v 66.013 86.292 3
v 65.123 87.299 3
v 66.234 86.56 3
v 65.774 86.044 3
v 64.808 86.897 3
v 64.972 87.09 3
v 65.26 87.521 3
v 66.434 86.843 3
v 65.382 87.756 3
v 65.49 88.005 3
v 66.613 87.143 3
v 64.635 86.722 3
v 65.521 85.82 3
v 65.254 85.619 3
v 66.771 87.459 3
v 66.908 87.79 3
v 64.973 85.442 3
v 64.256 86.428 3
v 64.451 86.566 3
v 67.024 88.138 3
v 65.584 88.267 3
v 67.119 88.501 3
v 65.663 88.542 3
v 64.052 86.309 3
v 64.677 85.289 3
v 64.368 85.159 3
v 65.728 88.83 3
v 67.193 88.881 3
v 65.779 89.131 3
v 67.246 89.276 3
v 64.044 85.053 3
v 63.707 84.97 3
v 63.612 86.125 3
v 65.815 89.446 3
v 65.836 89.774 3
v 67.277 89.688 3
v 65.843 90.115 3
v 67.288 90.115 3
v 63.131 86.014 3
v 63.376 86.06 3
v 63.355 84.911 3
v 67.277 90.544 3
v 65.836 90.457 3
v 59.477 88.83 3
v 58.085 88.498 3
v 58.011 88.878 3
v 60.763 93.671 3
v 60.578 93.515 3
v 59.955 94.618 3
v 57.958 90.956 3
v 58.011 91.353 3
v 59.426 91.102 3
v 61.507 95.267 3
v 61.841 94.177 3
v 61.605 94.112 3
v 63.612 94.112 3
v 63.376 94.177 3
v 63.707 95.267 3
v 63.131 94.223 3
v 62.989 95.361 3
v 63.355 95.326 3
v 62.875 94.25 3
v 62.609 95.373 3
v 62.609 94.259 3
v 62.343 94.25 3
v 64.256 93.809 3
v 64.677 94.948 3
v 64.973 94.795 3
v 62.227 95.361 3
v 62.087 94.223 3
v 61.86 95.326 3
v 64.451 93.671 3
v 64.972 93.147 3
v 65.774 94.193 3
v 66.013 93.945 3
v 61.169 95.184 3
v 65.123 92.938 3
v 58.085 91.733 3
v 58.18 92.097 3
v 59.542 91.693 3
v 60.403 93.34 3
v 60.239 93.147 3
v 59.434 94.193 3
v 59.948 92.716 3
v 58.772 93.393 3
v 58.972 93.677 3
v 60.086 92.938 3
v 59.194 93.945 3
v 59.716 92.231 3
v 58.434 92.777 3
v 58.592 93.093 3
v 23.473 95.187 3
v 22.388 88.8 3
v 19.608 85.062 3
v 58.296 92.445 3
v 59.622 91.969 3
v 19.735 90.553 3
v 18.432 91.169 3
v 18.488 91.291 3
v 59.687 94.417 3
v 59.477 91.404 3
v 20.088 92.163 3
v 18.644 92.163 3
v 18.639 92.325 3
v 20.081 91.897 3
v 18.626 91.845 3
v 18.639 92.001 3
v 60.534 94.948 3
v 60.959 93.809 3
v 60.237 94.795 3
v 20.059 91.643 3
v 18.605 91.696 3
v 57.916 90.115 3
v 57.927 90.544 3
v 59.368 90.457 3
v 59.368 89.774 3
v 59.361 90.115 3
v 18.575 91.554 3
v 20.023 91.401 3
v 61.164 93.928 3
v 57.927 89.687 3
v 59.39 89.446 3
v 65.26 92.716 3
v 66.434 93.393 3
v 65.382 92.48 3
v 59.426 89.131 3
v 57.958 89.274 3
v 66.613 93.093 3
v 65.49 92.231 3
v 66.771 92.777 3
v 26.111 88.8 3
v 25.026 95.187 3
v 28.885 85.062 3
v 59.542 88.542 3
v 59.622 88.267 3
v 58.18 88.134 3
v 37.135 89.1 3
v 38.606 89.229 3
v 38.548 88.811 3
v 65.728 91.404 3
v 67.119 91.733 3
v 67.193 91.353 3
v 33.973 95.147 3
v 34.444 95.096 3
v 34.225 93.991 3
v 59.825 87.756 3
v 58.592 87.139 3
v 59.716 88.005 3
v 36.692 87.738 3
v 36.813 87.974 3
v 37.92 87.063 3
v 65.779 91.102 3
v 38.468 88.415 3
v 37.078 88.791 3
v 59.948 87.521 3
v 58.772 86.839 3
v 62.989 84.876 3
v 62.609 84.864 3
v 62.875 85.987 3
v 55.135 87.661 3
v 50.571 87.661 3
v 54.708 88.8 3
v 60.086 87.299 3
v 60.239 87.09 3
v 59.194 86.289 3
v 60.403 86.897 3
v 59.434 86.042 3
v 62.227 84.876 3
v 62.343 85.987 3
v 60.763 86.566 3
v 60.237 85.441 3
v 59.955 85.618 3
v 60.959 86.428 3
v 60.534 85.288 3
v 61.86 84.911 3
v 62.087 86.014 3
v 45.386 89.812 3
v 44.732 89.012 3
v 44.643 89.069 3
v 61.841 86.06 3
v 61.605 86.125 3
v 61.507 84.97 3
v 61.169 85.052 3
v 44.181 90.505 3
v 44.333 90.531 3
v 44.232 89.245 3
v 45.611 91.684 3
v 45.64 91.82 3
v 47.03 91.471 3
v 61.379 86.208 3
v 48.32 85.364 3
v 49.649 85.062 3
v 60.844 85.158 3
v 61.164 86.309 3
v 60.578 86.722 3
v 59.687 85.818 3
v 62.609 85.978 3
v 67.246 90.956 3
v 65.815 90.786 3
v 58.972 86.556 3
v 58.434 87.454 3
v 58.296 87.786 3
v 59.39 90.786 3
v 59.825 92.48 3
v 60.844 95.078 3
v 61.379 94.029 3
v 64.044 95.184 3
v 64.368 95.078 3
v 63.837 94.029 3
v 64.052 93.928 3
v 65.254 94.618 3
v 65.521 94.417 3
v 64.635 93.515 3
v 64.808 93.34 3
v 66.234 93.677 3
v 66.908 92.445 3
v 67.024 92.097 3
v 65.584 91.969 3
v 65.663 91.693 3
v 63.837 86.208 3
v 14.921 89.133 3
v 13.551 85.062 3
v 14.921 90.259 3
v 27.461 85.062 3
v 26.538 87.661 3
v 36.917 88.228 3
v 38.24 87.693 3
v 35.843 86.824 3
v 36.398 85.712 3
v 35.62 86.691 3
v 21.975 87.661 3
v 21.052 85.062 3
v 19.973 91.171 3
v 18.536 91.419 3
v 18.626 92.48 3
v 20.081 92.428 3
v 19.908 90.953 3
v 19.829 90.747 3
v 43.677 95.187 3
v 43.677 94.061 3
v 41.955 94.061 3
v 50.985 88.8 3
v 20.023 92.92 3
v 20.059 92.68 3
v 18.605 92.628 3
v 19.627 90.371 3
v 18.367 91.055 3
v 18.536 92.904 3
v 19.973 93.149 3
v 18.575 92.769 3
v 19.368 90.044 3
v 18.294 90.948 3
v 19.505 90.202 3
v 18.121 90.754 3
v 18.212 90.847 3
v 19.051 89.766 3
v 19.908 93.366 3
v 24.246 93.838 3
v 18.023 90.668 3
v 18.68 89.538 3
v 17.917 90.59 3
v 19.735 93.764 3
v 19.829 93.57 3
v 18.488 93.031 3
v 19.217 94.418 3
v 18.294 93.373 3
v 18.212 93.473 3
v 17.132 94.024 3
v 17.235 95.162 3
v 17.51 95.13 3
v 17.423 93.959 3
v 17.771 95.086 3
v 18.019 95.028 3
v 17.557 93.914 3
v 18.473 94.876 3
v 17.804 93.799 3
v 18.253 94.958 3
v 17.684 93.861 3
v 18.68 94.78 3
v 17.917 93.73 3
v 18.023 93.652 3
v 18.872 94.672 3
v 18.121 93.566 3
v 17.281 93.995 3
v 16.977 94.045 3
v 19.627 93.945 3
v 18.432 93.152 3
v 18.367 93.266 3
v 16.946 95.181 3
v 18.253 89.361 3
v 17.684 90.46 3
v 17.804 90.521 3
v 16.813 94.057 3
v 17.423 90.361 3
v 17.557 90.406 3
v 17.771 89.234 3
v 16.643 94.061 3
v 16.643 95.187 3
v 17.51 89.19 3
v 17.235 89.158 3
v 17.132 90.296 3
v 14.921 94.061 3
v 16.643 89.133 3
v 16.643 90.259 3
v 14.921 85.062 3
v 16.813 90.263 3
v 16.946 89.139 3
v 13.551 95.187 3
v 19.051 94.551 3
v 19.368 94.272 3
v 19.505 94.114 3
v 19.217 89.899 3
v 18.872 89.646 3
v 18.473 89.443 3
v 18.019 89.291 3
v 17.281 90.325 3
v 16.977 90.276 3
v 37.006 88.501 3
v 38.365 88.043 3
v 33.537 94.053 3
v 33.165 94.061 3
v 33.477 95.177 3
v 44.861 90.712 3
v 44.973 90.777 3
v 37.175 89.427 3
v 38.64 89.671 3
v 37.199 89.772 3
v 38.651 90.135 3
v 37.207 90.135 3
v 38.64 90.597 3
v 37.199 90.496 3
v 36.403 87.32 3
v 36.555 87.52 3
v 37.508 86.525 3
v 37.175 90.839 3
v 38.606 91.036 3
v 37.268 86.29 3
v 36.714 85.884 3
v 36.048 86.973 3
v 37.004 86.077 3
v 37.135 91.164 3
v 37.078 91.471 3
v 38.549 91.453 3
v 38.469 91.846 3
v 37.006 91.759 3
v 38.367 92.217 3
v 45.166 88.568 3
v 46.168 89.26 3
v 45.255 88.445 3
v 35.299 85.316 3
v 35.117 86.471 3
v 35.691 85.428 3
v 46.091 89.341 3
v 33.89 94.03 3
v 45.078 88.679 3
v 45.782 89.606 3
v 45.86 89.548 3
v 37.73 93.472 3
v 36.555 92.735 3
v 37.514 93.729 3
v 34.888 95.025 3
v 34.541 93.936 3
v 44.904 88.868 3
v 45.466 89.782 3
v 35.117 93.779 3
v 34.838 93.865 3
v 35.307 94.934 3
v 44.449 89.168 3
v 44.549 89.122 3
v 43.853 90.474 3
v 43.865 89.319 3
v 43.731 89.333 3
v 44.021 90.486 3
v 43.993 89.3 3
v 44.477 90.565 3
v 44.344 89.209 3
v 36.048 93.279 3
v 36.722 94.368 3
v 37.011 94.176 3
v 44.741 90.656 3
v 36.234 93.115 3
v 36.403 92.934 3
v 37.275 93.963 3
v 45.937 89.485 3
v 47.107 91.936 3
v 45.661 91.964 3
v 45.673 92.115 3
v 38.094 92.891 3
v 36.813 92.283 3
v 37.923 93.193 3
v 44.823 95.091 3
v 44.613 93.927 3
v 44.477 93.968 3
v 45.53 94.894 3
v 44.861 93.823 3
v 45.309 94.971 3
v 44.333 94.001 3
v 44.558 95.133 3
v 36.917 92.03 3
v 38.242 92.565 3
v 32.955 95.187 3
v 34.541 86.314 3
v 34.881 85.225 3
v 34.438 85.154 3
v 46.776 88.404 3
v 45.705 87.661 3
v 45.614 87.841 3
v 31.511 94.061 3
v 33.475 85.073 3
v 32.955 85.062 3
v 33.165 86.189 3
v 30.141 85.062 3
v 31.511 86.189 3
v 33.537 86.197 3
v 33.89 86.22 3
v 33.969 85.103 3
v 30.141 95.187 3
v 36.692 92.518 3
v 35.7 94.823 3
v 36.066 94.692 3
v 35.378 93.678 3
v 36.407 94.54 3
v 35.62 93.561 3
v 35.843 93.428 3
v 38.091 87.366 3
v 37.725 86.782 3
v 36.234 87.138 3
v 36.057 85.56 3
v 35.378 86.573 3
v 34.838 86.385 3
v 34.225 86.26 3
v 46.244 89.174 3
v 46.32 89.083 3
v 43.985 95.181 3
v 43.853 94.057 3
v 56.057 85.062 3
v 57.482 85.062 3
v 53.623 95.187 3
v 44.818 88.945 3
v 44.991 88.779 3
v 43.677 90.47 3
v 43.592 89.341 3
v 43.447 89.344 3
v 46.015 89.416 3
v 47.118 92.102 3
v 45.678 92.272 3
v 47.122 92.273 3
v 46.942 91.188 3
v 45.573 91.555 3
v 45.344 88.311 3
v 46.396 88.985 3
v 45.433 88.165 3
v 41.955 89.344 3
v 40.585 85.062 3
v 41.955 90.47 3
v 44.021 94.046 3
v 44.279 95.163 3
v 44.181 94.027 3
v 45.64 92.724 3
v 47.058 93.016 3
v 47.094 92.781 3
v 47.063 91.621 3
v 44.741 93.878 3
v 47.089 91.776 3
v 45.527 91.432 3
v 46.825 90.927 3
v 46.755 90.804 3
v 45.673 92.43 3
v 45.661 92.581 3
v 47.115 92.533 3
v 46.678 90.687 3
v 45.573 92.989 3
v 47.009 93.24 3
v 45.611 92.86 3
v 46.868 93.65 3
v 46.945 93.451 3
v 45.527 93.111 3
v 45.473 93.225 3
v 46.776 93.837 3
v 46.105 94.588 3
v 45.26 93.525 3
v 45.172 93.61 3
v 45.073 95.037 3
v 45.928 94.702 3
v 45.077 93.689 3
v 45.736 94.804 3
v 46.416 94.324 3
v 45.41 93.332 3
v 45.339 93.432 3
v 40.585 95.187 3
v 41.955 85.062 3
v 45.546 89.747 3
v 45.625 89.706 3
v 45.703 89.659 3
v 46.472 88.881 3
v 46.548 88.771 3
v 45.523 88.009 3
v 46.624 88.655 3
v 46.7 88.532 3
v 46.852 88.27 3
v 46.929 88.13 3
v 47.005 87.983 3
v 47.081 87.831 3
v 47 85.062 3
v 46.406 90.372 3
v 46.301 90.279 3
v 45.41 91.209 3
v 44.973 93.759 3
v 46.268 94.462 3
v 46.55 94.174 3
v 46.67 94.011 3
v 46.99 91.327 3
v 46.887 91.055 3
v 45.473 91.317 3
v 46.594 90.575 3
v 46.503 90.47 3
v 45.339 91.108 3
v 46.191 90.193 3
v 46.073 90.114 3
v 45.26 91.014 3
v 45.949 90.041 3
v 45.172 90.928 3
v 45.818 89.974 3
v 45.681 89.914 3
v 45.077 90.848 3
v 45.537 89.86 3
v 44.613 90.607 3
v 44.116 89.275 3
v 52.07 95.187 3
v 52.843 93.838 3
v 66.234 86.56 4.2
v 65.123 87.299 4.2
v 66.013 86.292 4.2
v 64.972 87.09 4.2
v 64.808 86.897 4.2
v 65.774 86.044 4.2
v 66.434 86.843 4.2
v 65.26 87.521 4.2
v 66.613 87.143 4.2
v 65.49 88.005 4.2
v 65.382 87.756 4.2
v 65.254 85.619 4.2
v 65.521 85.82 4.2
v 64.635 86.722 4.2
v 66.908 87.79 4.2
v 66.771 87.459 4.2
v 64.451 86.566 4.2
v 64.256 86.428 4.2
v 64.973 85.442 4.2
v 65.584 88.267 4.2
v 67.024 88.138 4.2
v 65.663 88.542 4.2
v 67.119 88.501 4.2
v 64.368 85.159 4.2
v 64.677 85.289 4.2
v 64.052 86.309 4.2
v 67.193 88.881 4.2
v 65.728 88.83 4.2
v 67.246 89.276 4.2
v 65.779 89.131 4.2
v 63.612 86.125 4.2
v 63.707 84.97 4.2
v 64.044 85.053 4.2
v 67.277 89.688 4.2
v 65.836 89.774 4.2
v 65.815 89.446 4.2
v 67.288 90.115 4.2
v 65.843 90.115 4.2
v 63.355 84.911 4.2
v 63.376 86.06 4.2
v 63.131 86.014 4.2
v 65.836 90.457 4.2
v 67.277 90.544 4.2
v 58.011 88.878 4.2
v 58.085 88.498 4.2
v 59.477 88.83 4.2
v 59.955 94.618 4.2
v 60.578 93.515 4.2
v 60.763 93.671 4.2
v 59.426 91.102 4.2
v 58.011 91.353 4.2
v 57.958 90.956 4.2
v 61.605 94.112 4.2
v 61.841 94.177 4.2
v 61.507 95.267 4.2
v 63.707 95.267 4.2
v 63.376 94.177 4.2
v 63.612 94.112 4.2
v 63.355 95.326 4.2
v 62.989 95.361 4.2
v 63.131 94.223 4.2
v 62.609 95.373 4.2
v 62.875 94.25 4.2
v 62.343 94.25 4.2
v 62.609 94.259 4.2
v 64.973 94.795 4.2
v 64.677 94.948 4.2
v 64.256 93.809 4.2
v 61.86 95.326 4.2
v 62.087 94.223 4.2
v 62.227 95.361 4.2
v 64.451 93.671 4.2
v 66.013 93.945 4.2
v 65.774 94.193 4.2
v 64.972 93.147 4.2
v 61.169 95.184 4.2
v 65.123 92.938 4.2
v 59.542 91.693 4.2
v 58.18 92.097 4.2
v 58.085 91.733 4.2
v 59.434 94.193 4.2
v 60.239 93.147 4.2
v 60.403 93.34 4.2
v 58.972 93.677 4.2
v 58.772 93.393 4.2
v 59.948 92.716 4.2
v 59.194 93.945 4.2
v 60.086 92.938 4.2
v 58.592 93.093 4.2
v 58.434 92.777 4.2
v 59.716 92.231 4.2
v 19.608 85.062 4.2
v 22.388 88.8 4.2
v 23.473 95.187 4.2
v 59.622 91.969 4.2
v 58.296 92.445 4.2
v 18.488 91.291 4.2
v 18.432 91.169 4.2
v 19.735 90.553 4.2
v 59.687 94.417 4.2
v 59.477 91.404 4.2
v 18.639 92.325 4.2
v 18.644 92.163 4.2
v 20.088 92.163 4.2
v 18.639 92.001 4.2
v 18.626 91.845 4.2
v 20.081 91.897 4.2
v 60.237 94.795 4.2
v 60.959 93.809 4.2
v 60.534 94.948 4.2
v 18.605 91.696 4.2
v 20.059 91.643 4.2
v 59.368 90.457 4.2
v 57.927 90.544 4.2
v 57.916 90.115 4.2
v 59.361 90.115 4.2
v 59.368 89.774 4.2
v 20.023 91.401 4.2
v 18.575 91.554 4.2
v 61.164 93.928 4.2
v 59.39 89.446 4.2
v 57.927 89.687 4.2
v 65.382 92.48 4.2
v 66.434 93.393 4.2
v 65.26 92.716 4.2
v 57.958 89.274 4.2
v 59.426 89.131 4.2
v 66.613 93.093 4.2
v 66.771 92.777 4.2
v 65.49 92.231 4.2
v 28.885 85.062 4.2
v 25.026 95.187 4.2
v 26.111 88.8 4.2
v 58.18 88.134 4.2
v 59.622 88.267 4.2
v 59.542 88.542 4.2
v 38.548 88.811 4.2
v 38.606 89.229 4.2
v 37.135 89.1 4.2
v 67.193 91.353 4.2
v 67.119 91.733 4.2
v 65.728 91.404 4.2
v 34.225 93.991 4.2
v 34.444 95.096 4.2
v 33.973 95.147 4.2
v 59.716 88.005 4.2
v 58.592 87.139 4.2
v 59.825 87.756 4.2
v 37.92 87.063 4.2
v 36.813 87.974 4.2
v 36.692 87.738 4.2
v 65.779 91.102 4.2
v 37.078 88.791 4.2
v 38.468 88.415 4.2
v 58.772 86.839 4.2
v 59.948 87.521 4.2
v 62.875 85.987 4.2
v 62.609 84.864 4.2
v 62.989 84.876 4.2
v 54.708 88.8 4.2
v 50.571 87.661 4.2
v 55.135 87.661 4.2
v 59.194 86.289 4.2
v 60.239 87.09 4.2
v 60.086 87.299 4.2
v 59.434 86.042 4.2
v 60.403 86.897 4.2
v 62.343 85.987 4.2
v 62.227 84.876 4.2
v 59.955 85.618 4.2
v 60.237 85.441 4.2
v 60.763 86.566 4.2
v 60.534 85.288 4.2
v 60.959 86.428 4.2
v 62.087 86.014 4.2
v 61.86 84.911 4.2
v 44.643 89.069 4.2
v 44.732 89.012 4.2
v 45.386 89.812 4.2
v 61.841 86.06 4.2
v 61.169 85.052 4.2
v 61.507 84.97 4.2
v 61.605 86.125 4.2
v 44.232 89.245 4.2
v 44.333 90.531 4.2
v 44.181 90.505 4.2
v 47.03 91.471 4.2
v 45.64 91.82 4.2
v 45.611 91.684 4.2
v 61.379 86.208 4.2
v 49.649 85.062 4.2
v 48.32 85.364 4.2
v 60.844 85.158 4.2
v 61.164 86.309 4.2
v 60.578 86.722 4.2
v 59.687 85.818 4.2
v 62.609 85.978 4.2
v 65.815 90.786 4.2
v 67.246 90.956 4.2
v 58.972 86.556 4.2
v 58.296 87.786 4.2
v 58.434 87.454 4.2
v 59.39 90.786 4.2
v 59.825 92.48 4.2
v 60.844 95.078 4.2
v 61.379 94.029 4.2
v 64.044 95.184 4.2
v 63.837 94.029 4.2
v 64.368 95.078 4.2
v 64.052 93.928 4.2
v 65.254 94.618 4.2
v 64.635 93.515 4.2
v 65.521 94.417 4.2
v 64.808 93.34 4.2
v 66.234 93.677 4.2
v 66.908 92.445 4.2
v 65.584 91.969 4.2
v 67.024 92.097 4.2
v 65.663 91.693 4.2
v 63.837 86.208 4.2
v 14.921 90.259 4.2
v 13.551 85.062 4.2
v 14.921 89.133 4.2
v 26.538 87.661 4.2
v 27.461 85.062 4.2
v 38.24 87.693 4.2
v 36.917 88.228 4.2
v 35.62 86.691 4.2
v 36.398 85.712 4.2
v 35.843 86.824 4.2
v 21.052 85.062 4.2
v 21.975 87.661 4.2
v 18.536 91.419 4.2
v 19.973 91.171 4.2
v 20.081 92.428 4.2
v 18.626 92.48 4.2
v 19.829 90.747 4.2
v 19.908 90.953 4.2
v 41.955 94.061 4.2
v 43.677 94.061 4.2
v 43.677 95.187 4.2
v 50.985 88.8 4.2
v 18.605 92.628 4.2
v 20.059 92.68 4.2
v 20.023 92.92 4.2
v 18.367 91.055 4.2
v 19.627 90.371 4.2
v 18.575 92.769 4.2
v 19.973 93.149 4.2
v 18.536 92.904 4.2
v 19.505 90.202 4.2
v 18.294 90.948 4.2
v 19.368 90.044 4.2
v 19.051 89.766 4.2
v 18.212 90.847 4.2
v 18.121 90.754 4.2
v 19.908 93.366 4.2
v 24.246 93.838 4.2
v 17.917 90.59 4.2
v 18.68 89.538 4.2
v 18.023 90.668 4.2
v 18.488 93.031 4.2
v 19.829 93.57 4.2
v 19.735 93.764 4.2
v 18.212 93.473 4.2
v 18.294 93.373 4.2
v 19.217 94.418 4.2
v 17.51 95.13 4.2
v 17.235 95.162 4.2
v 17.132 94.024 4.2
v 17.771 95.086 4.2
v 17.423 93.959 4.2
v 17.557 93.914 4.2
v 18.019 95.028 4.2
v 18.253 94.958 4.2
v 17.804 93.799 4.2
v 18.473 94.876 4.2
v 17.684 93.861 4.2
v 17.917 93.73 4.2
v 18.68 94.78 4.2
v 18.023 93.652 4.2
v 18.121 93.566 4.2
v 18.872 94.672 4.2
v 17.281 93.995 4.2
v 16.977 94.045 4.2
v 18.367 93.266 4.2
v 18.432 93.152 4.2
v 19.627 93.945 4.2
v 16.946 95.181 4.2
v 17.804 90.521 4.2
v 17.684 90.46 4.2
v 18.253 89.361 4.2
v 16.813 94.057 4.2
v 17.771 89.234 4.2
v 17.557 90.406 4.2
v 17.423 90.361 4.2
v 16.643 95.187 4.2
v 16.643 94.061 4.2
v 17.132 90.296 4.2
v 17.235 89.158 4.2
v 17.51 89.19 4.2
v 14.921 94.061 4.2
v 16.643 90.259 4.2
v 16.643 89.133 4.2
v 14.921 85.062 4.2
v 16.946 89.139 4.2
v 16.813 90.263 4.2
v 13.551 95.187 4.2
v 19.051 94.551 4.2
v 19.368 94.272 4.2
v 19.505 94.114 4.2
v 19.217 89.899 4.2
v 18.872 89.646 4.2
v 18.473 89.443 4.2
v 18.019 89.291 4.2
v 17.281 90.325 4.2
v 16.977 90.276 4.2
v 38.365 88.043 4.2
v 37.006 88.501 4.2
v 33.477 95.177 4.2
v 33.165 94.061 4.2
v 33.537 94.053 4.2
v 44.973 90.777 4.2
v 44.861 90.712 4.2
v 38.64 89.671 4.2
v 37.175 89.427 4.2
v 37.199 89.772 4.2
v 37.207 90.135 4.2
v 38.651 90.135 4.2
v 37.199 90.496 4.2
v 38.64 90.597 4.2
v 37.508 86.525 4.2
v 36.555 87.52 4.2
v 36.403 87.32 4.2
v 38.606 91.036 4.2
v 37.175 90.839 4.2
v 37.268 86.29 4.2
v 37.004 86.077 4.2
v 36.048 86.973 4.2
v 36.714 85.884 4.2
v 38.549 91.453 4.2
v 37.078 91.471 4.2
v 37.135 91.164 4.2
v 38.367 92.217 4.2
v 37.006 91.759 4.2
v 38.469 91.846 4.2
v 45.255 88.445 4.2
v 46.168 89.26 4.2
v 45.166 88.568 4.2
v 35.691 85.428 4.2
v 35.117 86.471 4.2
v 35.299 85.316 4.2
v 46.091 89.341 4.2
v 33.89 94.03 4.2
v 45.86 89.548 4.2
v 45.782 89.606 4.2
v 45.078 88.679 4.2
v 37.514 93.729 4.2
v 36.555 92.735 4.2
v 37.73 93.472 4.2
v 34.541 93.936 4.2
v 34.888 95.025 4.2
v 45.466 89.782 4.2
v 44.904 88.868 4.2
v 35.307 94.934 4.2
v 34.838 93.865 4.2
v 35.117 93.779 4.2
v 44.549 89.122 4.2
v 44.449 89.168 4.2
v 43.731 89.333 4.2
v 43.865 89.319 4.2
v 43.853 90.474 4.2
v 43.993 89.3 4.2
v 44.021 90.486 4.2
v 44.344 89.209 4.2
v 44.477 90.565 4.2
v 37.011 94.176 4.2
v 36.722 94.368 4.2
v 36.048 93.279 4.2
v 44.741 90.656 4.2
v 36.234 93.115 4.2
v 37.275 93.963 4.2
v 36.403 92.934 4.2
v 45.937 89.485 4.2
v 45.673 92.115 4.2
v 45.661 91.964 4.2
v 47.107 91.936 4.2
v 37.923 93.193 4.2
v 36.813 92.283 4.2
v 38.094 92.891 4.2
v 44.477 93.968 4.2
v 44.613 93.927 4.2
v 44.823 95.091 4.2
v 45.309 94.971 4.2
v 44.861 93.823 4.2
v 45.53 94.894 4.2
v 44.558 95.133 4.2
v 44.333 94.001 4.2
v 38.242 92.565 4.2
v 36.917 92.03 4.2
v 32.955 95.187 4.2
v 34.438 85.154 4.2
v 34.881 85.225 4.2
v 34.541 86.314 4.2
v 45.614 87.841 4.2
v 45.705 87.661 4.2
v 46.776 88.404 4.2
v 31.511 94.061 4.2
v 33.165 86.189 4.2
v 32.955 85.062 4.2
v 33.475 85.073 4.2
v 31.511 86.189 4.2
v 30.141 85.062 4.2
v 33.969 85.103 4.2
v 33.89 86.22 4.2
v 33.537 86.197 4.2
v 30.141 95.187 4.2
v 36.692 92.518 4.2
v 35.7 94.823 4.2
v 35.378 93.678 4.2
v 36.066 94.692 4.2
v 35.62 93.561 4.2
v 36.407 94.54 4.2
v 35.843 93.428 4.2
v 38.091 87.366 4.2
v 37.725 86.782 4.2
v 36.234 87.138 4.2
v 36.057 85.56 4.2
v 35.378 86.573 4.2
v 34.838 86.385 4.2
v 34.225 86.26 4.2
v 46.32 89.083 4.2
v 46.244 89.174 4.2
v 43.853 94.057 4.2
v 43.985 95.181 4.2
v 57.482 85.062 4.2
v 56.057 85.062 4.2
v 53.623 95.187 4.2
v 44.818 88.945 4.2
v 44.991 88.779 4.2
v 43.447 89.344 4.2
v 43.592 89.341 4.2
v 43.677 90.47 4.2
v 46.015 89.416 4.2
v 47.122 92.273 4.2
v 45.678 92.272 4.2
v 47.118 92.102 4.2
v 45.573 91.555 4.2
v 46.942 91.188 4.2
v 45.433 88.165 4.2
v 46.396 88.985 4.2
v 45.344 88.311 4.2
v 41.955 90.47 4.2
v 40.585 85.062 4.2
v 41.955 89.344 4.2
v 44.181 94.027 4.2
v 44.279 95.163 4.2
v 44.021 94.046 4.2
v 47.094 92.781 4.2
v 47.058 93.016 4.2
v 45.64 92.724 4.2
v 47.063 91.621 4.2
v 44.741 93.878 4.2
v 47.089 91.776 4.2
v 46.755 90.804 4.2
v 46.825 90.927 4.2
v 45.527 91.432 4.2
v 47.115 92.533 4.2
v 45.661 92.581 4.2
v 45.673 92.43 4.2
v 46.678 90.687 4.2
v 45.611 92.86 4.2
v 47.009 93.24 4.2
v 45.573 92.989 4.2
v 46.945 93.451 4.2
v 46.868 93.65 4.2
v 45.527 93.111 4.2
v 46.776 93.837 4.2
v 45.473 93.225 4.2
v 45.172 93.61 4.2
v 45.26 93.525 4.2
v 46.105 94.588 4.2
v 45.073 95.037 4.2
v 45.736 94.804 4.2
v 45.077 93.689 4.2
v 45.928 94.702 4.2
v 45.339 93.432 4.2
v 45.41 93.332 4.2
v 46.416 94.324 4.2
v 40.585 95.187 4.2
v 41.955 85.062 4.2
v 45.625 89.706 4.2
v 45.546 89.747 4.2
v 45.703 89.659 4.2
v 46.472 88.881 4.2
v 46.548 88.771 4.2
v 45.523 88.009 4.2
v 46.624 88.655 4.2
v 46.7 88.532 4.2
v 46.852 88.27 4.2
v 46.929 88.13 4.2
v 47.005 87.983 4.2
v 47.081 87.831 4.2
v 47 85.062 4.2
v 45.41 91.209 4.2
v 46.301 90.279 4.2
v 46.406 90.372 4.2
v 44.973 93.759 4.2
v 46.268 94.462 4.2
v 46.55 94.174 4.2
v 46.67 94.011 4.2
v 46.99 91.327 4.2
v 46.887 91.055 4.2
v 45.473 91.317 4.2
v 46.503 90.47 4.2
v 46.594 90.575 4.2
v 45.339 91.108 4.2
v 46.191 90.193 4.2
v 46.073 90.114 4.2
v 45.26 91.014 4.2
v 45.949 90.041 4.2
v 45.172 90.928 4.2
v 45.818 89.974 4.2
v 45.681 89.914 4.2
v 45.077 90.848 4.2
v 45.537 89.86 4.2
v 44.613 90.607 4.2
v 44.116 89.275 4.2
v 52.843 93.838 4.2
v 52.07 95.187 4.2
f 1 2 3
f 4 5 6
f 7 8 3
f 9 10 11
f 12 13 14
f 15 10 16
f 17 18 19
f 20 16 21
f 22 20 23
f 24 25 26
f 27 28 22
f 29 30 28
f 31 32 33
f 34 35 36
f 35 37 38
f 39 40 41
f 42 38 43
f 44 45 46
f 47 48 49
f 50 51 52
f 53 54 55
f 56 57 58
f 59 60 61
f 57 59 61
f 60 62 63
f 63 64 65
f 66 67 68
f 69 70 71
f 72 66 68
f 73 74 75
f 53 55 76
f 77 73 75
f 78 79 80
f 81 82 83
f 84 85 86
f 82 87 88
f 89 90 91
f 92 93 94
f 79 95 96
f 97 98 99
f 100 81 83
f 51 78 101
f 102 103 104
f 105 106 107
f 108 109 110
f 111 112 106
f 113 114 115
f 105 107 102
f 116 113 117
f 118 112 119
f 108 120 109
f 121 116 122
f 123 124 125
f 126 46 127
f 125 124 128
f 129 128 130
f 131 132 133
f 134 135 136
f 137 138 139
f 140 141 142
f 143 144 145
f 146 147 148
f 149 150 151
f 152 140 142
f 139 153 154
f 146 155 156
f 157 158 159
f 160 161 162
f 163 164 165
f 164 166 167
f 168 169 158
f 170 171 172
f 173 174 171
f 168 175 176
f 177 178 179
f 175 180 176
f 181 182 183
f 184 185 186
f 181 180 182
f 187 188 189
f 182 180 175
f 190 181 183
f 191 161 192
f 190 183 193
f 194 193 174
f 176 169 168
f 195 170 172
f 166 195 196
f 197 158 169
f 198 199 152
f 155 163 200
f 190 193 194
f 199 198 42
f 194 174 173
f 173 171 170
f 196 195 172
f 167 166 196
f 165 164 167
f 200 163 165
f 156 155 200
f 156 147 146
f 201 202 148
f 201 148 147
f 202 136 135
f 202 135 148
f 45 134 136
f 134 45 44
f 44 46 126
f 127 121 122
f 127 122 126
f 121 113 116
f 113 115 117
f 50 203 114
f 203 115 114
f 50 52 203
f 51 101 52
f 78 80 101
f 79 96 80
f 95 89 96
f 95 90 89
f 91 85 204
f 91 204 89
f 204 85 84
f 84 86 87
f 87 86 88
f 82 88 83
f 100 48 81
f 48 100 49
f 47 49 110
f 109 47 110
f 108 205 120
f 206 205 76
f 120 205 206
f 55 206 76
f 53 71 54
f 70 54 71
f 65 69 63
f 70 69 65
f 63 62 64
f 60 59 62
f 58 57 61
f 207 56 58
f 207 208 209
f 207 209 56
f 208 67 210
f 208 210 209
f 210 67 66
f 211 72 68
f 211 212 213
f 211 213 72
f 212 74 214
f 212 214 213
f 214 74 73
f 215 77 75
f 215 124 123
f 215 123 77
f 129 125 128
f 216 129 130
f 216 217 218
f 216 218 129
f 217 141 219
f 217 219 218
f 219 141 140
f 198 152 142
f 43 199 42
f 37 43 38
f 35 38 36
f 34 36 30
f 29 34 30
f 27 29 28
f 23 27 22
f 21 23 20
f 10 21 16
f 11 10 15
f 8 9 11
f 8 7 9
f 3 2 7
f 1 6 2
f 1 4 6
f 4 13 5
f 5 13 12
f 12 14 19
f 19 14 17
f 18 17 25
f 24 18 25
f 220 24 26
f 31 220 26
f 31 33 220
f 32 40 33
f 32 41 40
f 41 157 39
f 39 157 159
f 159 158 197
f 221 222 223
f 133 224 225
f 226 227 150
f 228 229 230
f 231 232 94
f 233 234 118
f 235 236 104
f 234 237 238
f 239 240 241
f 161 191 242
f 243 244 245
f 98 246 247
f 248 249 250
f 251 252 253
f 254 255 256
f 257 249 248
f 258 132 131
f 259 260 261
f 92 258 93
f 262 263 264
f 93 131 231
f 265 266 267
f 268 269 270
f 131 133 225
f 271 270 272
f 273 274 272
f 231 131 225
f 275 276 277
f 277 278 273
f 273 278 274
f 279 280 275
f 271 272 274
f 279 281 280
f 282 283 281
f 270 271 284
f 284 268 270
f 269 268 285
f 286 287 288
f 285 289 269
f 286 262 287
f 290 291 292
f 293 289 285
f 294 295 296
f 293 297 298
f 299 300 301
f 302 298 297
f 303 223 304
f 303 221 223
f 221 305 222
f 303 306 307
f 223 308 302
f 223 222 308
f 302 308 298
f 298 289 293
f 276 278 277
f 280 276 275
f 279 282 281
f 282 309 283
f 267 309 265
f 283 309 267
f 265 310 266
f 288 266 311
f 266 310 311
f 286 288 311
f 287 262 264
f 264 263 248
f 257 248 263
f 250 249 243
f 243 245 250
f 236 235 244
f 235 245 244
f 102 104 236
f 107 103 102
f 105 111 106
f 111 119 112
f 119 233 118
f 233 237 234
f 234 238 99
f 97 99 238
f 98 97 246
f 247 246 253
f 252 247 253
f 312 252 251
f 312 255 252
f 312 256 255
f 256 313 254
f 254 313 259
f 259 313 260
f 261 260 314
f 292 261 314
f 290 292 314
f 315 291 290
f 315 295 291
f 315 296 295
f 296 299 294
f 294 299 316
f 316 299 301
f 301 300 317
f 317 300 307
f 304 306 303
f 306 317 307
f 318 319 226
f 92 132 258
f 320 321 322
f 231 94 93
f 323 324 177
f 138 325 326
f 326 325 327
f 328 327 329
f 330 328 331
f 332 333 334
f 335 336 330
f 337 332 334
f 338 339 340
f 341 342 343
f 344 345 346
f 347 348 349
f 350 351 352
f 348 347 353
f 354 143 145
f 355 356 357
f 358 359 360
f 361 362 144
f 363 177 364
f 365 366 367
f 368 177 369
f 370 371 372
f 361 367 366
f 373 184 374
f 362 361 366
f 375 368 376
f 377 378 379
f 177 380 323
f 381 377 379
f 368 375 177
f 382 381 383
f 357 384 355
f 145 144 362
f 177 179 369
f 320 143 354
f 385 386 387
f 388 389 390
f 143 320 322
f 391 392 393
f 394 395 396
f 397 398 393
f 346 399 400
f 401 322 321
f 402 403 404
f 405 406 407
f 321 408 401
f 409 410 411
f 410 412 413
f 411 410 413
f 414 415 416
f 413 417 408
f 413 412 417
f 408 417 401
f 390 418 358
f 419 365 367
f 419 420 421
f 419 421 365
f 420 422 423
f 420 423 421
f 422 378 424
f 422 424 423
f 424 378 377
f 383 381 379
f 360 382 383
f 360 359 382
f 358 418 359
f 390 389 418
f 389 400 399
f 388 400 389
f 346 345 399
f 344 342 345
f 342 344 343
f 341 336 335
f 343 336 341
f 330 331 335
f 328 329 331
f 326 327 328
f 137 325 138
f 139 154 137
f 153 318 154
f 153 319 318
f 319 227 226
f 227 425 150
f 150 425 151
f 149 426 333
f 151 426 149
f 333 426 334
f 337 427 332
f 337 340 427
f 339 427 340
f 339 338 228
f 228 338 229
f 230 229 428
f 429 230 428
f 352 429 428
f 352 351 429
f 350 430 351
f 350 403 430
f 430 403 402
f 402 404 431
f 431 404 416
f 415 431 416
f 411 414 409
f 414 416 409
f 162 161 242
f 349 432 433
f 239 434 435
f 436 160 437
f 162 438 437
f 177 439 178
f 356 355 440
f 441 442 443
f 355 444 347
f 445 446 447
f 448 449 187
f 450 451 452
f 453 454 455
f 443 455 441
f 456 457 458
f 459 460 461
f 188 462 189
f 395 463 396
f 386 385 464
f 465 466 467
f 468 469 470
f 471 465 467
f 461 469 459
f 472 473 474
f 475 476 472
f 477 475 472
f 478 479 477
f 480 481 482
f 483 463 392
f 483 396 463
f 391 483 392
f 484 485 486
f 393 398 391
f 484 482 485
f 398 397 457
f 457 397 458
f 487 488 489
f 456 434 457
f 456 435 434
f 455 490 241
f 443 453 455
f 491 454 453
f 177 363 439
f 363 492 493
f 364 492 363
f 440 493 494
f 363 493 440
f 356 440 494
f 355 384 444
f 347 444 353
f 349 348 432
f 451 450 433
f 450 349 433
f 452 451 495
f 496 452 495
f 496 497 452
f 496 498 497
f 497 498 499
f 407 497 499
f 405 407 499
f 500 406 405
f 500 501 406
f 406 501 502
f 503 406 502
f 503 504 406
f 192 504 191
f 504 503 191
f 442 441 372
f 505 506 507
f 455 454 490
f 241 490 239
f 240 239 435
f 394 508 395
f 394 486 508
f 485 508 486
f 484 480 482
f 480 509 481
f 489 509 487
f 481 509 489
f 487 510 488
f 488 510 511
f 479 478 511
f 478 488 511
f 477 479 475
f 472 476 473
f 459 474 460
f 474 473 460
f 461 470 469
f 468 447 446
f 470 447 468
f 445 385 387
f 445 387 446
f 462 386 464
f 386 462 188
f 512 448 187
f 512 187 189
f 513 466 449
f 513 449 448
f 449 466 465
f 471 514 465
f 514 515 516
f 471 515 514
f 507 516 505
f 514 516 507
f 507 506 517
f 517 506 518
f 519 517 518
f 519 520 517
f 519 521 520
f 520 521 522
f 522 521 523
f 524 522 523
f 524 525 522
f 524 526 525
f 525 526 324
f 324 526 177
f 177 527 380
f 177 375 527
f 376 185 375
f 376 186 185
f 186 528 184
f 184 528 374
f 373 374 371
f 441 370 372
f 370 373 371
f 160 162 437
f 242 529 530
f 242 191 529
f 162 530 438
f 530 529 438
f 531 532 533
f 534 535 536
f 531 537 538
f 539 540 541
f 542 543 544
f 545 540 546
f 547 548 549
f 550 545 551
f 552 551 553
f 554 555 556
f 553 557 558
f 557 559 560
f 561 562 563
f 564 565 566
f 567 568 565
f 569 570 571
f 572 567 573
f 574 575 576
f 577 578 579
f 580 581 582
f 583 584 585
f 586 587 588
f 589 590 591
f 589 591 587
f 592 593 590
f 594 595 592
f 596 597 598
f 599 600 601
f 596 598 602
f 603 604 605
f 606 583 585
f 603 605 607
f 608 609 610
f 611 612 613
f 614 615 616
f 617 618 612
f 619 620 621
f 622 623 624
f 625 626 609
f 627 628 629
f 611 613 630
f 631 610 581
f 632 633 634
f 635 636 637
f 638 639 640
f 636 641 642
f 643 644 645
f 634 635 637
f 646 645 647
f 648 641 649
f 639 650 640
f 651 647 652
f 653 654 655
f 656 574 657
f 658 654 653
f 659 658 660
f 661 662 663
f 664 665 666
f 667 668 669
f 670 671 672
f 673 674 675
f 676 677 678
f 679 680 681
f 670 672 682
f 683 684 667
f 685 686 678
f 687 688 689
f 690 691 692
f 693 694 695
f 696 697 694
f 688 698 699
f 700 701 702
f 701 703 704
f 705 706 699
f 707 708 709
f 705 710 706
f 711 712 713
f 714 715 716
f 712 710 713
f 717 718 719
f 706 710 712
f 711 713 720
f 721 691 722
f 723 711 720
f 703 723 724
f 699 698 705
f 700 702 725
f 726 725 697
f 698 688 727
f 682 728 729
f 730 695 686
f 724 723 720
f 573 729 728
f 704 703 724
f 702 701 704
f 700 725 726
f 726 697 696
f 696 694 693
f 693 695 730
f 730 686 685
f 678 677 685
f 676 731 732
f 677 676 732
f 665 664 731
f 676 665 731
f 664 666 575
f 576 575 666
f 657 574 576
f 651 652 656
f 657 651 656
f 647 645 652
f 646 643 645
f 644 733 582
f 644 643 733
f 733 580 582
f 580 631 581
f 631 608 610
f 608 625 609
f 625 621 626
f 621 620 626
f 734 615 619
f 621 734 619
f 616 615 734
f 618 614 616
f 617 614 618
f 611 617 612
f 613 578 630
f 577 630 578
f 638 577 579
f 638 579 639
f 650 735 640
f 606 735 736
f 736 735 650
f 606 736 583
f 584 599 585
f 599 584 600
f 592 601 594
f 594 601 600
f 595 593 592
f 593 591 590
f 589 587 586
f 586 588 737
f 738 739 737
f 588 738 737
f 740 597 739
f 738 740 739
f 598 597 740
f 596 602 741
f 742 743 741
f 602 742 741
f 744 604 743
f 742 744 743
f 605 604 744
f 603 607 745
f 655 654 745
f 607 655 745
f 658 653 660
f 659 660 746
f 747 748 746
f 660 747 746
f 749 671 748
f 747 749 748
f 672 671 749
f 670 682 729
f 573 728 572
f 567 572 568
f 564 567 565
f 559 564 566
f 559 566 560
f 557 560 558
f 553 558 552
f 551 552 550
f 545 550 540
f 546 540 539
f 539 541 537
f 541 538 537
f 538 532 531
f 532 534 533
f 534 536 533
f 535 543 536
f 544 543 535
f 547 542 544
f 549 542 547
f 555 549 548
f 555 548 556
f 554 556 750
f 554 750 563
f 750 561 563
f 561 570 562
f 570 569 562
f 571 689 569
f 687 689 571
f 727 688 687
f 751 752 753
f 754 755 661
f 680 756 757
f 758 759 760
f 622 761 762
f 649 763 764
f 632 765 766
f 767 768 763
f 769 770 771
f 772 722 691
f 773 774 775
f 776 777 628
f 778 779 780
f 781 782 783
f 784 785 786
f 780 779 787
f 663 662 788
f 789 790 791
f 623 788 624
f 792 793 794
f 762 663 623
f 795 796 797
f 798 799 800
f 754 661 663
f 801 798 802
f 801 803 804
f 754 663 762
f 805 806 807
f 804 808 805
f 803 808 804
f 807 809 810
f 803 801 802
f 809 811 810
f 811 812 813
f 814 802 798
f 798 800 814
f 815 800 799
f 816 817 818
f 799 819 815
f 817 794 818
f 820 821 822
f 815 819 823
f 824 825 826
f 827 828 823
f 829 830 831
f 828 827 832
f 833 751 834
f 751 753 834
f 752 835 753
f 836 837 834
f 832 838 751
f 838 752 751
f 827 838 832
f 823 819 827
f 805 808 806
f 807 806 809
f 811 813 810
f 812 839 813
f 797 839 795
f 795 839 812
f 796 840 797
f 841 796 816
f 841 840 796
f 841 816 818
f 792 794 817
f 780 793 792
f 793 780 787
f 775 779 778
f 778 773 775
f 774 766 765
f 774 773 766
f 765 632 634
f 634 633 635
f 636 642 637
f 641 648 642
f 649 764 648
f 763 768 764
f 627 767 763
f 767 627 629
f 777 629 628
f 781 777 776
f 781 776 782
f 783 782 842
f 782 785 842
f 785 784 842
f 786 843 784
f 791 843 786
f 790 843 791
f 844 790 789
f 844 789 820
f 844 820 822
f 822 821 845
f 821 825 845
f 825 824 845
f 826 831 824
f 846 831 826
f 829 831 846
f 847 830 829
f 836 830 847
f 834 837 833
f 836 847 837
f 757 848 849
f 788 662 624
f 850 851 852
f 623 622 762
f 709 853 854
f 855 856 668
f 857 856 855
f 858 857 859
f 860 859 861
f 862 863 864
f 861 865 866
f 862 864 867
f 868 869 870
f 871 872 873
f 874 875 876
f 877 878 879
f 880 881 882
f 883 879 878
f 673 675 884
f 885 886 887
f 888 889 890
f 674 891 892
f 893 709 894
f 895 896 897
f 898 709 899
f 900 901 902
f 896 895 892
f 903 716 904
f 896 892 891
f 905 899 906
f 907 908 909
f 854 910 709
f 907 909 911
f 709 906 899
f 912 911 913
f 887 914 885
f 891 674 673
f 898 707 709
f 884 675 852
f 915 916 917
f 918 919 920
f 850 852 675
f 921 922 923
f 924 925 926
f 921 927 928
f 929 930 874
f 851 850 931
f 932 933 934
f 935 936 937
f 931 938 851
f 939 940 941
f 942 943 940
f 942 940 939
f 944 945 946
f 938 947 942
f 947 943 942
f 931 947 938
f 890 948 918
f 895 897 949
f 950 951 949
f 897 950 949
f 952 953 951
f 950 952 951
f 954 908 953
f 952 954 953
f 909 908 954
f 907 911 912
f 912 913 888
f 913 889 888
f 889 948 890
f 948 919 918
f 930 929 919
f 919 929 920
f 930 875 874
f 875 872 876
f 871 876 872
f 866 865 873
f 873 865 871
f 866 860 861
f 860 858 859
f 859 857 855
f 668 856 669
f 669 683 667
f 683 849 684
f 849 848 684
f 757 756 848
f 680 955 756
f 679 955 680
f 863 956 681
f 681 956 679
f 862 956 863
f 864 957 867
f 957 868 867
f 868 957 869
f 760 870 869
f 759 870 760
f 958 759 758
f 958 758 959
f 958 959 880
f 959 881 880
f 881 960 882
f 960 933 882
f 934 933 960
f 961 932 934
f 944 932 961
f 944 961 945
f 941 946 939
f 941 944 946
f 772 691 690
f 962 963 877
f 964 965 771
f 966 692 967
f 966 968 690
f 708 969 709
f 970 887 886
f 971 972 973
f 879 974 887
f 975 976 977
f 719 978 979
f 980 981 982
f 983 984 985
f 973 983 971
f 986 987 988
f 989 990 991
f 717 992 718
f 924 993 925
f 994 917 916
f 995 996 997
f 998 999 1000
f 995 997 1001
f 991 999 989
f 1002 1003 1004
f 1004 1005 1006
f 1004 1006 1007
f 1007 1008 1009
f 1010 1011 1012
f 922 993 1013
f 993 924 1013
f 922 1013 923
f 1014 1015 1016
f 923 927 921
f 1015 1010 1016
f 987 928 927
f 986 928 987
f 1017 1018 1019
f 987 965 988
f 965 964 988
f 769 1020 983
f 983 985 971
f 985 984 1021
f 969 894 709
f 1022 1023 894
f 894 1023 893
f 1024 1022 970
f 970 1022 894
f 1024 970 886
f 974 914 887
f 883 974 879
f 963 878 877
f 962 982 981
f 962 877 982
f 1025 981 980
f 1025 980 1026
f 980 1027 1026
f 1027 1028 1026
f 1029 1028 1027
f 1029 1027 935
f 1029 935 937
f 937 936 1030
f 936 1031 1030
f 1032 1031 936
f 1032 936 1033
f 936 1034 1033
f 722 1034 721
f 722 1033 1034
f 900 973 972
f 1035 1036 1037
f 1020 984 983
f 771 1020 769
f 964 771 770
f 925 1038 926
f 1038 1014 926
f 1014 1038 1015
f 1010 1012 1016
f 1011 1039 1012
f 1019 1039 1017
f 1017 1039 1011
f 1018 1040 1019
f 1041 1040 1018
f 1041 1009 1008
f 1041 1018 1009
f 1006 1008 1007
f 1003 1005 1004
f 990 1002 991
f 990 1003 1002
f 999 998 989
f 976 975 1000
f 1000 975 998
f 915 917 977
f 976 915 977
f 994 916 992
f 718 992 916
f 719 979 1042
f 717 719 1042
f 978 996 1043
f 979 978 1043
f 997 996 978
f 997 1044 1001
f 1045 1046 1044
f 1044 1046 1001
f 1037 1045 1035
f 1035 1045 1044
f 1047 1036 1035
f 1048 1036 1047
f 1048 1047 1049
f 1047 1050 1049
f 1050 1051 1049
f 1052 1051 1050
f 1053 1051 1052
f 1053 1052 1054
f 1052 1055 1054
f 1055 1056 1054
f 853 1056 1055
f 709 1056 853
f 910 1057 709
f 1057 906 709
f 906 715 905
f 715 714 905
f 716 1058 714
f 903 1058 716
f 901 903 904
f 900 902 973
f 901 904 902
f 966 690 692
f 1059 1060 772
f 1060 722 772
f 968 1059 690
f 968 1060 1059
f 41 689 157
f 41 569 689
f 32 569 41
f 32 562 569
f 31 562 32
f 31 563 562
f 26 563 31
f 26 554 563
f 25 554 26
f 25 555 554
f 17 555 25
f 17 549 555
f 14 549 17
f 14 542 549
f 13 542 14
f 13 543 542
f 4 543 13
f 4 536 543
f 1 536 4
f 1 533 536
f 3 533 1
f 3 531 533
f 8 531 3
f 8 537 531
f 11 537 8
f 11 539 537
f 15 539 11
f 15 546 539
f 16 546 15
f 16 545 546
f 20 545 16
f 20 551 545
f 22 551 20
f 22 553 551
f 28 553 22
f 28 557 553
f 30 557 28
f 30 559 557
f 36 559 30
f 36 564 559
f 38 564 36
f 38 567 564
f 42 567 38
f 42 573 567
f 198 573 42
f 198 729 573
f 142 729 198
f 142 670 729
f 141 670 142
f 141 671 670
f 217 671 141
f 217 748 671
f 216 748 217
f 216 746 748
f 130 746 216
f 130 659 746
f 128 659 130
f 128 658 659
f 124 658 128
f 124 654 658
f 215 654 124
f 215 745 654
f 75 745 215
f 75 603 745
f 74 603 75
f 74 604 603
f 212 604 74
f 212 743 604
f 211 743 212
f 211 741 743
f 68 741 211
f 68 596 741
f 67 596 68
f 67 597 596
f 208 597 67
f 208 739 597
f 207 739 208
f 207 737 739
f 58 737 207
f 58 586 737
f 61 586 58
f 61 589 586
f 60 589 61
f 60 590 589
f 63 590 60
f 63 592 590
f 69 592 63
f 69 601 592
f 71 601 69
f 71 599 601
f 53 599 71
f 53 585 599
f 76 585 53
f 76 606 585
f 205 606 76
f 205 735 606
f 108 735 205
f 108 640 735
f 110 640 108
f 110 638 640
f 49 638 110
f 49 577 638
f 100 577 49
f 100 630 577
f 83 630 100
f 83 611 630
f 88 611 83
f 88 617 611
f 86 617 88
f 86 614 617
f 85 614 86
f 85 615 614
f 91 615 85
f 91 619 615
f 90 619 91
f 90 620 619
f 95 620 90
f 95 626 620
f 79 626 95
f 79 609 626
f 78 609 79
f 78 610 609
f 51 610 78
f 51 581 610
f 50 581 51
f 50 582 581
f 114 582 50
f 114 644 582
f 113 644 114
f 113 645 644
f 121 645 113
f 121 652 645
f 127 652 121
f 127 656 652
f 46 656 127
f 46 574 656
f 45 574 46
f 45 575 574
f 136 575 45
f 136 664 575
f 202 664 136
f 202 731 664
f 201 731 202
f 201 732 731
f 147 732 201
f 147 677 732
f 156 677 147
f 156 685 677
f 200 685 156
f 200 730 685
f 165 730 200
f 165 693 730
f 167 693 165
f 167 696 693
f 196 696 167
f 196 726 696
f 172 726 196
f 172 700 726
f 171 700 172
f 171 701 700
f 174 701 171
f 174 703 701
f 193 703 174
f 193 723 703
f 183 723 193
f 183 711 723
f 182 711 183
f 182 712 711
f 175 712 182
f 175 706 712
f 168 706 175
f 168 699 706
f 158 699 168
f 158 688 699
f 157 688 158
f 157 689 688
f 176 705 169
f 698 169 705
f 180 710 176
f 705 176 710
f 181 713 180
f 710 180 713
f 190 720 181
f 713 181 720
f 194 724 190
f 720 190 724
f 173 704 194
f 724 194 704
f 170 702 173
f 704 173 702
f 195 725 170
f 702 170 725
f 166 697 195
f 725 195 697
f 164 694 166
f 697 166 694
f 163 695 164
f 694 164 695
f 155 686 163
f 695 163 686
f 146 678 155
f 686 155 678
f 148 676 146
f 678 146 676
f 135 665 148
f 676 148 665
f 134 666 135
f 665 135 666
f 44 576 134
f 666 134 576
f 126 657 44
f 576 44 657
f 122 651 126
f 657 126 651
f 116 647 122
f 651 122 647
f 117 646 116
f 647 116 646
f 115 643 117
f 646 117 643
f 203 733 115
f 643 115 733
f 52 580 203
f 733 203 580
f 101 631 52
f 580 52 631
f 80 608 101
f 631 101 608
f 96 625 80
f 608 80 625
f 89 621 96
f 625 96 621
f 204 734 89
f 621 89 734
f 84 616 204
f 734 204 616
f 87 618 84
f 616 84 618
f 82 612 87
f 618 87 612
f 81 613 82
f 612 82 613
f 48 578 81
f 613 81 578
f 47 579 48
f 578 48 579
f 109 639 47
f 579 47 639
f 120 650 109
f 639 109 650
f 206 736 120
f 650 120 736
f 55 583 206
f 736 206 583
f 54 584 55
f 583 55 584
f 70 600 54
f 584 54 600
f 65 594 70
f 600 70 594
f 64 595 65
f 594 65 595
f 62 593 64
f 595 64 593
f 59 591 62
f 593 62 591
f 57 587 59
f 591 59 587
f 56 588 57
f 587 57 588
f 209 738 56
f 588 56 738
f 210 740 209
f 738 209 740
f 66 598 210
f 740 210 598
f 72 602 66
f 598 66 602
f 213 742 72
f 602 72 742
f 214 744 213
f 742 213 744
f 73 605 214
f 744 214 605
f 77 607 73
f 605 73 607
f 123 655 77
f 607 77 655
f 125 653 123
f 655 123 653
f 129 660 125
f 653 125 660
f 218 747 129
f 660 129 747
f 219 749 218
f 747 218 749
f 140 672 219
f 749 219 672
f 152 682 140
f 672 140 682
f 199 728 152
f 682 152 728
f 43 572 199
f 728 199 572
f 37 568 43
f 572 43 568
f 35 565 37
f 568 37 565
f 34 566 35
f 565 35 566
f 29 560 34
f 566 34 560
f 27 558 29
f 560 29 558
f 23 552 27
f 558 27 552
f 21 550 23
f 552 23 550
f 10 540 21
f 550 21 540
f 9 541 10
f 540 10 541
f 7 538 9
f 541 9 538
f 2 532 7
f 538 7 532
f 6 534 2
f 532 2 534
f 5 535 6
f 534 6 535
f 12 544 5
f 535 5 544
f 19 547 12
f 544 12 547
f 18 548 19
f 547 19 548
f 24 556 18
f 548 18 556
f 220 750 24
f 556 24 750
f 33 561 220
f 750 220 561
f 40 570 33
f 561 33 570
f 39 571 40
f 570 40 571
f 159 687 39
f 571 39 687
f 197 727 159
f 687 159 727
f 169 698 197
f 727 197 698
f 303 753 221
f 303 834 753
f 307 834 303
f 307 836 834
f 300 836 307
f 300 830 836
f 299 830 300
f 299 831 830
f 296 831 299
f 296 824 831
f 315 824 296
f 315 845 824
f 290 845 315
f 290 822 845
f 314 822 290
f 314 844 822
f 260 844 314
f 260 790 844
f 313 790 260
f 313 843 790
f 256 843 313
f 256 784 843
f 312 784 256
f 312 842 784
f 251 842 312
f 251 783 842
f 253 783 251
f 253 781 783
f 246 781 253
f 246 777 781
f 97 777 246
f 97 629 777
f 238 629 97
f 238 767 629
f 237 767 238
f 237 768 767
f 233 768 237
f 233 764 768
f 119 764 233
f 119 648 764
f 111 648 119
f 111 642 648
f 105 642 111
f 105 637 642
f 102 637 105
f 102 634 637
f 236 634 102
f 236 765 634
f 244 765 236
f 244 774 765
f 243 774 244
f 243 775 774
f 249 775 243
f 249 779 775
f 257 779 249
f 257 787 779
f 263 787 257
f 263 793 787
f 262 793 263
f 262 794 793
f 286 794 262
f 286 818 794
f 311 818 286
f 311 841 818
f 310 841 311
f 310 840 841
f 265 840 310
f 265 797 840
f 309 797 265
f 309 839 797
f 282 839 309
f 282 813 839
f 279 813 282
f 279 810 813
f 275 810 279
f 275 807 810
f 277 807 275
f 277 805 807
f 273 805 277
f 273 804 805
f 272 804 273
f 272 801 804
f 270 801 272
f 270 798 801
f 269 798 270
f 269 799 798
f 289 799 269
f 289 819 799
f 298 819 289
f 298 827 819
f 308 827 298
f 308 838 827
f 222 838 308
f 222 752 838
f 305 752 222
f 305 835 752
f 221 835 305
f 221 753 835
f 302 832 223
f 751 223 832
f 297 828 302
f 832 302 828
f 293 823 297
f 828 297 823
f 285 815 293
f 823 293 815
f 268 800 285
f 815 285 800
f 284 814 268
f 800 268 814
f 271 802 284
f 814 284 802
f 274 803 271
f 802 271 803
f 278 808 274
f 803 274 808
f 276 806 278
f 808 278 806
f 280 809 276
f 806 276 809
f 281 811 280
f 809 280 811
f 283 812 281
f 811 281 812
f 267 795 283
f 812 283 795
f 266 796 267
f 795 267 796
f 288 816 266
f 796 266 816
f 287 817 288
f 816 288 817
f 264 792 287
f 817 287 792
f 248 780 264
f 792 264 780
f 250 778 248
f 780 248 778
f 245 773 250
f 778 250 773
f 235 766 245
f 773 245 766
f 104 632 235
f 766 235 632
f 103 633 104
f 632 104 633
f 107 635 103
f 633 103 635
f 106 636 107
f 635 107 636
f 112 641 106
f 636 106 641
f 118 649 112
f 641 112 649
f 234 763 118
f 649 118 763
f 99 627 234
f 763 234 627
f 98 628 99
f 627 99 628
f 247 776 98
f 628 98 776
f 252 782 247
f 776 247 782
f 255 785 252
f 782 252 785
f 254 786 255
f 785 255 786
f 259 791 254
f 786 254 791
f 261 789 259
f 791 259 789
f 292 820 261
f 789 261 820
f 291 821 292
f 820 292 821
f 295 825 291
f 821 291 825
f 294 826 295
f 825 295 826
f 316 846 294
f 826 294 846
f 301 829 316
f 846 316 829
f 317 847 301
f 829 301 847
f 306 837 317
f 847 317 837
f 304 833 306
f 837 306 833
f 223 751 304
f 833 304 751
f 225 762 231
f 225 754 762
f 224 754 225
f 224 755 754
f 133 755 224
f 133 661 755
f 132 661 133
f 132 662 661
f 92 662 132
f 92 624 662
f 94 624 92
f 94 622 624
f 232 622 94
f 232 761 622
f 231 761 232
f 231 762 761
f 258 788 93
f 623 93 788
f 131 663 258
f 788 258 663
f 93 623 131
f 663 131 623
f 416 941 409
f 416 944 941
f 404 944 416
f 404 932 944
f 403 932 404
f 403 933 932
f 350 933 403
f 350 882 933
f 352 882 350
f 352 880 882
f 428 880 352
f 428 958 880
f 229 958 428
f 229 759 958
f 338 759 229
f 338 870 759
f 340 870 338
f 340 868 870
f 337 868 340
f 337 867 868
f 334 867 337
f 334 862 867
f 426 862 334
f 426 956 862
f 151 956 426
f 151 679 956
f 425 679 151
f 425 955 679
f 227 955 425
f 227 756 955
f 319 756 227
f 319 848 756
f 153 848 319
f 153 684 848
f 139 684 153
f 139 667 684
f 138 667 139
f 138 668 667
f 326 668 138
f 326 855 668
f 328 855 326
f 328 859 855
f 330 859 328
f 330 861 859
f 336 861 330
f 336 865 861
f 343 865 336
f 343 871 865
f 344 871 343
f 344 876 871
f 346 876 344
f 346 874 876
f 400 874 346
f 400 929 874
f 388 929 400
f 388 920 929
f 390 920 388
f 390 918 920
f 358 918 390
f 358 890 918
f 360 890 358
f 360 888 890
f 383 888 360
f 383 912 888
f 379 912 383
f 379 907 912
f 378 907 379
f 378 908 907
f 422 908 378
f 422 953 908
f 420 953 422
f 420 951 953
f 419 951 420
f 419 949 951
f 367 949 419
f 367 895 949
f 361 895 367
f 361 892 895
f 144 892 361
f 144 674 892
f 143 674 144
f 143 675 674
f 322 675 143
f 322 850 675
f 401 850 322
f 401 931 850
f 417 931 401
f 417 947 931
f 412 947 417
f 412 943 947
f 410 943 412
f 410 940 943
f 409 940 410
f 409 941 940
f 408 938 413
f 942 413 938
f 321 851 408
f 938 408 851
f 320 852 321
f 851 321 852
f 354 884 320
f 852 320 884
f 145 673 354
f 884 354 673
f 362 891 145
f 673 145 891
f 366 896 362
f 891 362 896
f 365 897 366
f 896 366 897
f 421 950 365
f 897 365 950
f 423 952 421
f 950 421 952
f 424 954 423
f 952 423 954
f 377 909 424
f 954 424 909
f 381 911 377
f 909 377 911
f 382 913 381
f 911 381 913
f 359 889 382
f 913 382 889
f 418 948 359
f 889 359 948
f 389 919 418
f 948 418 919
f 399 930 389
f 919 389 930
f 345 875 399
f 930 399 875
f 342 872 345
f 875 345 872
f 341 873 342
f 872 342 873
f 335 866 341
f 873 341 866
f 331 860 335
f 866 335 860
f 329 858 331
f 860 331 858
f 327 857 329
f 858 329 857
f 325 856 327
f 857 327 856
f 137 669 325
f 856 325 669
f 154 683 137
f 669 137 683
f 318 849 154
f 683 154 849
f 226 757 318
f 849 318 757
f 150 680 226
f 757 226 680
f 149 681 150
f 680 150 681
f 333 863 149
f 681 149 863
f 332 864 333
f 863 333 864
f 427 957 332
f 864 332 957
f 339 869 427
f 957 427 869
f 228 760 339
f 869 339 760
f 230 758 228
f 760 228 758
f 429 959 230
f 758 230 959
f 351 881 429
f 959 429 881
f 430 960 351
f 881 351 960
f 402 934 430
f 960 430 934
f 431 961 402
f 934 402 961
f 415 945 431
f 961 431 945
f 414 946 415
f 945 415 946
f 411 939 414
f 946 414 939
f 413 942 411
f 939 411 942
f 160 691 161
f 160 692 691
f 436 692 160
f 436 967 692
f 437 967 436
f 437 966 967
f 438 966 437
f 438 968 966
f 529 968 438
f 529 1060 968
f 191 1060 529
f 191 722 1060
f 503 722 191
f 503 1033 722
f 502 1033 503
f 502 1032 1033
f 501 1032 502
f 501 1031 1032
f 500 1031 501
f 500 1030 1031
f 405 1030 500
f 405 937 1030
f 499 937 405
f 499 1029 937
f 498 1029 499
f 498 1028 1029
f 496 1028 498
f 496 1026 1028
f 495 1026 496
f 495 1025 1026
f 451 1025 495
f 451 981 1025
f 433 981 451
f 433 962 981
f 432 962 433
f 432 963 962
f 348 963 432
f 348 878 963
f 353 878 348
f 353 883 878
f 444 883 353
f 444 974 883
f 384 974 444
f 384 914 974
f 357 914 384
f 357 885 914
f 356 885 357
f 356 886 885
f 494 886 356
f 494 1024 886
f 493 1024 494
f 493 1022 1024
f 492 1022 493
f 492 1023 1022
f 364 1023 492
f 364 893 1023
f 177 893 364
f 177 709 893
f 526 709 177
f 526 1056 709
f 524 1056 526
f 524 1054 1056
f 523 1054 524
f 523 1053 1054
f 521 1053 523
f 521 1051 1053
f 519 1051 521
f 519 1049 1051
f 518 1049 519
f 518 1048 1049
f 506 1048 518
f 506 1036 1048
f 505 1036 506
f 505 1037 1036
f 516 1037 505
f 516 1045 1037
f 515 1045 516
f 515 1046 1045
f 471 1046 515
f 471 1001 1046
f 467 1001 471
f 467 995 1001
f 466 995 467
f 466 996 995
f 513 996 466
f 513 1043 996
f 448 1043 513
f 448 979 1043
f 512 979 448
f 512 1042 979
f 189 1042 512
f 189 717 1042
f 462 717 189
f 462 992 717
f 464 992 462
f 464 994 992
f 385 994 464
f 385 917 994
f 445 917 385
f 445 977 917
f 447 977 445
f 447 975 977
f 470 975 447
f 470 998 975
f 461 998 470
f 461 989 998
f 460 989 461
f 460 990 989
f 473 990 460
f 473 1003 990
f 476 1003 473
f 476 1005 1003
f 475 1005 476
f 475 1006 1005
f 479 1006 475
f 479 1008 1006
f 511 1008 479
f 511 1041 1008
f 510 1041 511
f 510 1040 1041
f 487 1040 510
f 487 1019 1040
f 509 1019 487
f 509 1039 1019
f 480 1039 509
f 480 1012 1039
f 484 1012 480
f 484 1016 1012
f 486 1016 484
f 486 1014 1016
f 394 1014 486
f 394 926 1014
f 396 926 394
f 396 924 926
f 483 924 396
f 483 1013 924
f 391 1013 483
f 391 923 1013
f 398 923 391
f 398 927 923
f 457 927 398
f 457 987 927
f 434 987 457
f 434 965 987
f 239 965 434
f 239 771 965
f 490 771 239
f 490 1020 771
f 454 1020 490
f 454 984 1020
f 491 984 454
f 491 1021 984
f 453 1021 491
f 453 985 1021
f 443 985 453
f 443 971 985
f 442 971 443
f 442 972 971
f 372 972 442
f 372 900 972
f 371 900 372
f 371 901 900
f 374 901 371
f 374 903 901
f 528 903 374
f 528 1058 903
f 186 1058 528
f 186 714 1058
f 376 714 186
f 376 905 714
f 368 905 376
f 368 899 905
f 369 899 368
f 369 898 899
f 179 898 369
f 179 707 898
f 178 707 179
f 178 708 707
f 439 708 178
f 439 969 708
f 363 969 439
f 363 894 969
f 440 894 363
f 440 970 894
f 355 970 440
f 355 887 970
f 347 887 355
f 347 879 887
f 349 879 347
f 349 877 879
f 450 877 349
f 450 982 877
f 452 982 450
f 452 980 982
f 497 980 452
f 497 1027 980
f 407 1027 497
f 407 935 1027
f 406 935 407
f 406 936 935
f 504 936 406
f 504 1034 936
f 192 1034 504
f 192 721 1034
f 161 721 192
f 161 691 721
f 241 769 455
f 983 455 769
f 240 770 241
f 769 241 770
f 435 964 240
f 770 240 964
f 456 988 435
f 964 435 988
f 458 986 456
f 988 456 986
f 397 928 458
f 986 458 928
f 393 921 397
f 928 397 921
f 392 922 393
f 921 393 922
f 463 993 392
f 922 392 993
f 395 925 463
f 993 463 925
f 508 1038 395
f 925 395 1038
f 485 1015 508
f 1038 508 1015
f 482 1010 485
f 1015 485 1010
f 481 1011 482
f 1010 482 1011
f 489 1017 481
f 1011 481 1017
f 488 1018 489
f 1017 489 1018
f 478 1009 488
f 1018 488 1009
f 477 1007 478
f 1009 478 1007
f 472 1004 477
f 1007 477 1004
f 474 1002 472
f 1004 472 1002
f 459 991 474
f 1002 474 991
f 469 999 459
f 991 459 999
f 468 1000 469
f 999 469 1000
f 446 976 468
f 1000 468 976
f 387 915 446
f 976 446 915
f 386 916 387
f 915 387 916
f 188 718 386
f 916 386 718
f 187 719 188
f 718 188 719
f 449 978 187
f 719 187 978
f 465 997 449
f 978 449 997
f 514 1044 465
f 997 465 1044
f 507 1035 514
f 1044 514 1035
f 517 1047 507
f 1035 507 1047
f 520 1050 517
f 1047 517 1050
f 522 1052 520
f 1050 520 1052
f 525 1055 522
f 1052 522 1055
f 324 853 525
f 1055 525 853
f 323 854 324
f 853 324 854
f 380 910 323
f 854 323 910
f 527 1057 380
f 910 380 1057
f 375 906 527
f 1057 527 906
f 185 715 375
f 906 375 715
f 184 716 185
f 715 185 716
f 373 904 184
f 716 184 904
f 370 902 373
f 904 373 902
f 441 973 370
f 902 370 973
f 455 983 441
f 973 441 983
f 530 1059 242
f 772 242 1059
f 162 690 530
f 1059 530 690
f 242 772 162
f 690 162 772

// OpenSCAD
$fn = 80;

nome = "PADRAO";
largura = 80;
altura = 105;

espessura_base = 3;
altura_texto = 1.2;
tamanho_texto = 10;

translate([largura / 2, altura - 15, espessura_base])
linear_extrude(height = altura_texto)
text(
    nome,
    size = tamanho_texto,
    font = "Arial Black",
    halign = "center",
    valign = "center"
);
